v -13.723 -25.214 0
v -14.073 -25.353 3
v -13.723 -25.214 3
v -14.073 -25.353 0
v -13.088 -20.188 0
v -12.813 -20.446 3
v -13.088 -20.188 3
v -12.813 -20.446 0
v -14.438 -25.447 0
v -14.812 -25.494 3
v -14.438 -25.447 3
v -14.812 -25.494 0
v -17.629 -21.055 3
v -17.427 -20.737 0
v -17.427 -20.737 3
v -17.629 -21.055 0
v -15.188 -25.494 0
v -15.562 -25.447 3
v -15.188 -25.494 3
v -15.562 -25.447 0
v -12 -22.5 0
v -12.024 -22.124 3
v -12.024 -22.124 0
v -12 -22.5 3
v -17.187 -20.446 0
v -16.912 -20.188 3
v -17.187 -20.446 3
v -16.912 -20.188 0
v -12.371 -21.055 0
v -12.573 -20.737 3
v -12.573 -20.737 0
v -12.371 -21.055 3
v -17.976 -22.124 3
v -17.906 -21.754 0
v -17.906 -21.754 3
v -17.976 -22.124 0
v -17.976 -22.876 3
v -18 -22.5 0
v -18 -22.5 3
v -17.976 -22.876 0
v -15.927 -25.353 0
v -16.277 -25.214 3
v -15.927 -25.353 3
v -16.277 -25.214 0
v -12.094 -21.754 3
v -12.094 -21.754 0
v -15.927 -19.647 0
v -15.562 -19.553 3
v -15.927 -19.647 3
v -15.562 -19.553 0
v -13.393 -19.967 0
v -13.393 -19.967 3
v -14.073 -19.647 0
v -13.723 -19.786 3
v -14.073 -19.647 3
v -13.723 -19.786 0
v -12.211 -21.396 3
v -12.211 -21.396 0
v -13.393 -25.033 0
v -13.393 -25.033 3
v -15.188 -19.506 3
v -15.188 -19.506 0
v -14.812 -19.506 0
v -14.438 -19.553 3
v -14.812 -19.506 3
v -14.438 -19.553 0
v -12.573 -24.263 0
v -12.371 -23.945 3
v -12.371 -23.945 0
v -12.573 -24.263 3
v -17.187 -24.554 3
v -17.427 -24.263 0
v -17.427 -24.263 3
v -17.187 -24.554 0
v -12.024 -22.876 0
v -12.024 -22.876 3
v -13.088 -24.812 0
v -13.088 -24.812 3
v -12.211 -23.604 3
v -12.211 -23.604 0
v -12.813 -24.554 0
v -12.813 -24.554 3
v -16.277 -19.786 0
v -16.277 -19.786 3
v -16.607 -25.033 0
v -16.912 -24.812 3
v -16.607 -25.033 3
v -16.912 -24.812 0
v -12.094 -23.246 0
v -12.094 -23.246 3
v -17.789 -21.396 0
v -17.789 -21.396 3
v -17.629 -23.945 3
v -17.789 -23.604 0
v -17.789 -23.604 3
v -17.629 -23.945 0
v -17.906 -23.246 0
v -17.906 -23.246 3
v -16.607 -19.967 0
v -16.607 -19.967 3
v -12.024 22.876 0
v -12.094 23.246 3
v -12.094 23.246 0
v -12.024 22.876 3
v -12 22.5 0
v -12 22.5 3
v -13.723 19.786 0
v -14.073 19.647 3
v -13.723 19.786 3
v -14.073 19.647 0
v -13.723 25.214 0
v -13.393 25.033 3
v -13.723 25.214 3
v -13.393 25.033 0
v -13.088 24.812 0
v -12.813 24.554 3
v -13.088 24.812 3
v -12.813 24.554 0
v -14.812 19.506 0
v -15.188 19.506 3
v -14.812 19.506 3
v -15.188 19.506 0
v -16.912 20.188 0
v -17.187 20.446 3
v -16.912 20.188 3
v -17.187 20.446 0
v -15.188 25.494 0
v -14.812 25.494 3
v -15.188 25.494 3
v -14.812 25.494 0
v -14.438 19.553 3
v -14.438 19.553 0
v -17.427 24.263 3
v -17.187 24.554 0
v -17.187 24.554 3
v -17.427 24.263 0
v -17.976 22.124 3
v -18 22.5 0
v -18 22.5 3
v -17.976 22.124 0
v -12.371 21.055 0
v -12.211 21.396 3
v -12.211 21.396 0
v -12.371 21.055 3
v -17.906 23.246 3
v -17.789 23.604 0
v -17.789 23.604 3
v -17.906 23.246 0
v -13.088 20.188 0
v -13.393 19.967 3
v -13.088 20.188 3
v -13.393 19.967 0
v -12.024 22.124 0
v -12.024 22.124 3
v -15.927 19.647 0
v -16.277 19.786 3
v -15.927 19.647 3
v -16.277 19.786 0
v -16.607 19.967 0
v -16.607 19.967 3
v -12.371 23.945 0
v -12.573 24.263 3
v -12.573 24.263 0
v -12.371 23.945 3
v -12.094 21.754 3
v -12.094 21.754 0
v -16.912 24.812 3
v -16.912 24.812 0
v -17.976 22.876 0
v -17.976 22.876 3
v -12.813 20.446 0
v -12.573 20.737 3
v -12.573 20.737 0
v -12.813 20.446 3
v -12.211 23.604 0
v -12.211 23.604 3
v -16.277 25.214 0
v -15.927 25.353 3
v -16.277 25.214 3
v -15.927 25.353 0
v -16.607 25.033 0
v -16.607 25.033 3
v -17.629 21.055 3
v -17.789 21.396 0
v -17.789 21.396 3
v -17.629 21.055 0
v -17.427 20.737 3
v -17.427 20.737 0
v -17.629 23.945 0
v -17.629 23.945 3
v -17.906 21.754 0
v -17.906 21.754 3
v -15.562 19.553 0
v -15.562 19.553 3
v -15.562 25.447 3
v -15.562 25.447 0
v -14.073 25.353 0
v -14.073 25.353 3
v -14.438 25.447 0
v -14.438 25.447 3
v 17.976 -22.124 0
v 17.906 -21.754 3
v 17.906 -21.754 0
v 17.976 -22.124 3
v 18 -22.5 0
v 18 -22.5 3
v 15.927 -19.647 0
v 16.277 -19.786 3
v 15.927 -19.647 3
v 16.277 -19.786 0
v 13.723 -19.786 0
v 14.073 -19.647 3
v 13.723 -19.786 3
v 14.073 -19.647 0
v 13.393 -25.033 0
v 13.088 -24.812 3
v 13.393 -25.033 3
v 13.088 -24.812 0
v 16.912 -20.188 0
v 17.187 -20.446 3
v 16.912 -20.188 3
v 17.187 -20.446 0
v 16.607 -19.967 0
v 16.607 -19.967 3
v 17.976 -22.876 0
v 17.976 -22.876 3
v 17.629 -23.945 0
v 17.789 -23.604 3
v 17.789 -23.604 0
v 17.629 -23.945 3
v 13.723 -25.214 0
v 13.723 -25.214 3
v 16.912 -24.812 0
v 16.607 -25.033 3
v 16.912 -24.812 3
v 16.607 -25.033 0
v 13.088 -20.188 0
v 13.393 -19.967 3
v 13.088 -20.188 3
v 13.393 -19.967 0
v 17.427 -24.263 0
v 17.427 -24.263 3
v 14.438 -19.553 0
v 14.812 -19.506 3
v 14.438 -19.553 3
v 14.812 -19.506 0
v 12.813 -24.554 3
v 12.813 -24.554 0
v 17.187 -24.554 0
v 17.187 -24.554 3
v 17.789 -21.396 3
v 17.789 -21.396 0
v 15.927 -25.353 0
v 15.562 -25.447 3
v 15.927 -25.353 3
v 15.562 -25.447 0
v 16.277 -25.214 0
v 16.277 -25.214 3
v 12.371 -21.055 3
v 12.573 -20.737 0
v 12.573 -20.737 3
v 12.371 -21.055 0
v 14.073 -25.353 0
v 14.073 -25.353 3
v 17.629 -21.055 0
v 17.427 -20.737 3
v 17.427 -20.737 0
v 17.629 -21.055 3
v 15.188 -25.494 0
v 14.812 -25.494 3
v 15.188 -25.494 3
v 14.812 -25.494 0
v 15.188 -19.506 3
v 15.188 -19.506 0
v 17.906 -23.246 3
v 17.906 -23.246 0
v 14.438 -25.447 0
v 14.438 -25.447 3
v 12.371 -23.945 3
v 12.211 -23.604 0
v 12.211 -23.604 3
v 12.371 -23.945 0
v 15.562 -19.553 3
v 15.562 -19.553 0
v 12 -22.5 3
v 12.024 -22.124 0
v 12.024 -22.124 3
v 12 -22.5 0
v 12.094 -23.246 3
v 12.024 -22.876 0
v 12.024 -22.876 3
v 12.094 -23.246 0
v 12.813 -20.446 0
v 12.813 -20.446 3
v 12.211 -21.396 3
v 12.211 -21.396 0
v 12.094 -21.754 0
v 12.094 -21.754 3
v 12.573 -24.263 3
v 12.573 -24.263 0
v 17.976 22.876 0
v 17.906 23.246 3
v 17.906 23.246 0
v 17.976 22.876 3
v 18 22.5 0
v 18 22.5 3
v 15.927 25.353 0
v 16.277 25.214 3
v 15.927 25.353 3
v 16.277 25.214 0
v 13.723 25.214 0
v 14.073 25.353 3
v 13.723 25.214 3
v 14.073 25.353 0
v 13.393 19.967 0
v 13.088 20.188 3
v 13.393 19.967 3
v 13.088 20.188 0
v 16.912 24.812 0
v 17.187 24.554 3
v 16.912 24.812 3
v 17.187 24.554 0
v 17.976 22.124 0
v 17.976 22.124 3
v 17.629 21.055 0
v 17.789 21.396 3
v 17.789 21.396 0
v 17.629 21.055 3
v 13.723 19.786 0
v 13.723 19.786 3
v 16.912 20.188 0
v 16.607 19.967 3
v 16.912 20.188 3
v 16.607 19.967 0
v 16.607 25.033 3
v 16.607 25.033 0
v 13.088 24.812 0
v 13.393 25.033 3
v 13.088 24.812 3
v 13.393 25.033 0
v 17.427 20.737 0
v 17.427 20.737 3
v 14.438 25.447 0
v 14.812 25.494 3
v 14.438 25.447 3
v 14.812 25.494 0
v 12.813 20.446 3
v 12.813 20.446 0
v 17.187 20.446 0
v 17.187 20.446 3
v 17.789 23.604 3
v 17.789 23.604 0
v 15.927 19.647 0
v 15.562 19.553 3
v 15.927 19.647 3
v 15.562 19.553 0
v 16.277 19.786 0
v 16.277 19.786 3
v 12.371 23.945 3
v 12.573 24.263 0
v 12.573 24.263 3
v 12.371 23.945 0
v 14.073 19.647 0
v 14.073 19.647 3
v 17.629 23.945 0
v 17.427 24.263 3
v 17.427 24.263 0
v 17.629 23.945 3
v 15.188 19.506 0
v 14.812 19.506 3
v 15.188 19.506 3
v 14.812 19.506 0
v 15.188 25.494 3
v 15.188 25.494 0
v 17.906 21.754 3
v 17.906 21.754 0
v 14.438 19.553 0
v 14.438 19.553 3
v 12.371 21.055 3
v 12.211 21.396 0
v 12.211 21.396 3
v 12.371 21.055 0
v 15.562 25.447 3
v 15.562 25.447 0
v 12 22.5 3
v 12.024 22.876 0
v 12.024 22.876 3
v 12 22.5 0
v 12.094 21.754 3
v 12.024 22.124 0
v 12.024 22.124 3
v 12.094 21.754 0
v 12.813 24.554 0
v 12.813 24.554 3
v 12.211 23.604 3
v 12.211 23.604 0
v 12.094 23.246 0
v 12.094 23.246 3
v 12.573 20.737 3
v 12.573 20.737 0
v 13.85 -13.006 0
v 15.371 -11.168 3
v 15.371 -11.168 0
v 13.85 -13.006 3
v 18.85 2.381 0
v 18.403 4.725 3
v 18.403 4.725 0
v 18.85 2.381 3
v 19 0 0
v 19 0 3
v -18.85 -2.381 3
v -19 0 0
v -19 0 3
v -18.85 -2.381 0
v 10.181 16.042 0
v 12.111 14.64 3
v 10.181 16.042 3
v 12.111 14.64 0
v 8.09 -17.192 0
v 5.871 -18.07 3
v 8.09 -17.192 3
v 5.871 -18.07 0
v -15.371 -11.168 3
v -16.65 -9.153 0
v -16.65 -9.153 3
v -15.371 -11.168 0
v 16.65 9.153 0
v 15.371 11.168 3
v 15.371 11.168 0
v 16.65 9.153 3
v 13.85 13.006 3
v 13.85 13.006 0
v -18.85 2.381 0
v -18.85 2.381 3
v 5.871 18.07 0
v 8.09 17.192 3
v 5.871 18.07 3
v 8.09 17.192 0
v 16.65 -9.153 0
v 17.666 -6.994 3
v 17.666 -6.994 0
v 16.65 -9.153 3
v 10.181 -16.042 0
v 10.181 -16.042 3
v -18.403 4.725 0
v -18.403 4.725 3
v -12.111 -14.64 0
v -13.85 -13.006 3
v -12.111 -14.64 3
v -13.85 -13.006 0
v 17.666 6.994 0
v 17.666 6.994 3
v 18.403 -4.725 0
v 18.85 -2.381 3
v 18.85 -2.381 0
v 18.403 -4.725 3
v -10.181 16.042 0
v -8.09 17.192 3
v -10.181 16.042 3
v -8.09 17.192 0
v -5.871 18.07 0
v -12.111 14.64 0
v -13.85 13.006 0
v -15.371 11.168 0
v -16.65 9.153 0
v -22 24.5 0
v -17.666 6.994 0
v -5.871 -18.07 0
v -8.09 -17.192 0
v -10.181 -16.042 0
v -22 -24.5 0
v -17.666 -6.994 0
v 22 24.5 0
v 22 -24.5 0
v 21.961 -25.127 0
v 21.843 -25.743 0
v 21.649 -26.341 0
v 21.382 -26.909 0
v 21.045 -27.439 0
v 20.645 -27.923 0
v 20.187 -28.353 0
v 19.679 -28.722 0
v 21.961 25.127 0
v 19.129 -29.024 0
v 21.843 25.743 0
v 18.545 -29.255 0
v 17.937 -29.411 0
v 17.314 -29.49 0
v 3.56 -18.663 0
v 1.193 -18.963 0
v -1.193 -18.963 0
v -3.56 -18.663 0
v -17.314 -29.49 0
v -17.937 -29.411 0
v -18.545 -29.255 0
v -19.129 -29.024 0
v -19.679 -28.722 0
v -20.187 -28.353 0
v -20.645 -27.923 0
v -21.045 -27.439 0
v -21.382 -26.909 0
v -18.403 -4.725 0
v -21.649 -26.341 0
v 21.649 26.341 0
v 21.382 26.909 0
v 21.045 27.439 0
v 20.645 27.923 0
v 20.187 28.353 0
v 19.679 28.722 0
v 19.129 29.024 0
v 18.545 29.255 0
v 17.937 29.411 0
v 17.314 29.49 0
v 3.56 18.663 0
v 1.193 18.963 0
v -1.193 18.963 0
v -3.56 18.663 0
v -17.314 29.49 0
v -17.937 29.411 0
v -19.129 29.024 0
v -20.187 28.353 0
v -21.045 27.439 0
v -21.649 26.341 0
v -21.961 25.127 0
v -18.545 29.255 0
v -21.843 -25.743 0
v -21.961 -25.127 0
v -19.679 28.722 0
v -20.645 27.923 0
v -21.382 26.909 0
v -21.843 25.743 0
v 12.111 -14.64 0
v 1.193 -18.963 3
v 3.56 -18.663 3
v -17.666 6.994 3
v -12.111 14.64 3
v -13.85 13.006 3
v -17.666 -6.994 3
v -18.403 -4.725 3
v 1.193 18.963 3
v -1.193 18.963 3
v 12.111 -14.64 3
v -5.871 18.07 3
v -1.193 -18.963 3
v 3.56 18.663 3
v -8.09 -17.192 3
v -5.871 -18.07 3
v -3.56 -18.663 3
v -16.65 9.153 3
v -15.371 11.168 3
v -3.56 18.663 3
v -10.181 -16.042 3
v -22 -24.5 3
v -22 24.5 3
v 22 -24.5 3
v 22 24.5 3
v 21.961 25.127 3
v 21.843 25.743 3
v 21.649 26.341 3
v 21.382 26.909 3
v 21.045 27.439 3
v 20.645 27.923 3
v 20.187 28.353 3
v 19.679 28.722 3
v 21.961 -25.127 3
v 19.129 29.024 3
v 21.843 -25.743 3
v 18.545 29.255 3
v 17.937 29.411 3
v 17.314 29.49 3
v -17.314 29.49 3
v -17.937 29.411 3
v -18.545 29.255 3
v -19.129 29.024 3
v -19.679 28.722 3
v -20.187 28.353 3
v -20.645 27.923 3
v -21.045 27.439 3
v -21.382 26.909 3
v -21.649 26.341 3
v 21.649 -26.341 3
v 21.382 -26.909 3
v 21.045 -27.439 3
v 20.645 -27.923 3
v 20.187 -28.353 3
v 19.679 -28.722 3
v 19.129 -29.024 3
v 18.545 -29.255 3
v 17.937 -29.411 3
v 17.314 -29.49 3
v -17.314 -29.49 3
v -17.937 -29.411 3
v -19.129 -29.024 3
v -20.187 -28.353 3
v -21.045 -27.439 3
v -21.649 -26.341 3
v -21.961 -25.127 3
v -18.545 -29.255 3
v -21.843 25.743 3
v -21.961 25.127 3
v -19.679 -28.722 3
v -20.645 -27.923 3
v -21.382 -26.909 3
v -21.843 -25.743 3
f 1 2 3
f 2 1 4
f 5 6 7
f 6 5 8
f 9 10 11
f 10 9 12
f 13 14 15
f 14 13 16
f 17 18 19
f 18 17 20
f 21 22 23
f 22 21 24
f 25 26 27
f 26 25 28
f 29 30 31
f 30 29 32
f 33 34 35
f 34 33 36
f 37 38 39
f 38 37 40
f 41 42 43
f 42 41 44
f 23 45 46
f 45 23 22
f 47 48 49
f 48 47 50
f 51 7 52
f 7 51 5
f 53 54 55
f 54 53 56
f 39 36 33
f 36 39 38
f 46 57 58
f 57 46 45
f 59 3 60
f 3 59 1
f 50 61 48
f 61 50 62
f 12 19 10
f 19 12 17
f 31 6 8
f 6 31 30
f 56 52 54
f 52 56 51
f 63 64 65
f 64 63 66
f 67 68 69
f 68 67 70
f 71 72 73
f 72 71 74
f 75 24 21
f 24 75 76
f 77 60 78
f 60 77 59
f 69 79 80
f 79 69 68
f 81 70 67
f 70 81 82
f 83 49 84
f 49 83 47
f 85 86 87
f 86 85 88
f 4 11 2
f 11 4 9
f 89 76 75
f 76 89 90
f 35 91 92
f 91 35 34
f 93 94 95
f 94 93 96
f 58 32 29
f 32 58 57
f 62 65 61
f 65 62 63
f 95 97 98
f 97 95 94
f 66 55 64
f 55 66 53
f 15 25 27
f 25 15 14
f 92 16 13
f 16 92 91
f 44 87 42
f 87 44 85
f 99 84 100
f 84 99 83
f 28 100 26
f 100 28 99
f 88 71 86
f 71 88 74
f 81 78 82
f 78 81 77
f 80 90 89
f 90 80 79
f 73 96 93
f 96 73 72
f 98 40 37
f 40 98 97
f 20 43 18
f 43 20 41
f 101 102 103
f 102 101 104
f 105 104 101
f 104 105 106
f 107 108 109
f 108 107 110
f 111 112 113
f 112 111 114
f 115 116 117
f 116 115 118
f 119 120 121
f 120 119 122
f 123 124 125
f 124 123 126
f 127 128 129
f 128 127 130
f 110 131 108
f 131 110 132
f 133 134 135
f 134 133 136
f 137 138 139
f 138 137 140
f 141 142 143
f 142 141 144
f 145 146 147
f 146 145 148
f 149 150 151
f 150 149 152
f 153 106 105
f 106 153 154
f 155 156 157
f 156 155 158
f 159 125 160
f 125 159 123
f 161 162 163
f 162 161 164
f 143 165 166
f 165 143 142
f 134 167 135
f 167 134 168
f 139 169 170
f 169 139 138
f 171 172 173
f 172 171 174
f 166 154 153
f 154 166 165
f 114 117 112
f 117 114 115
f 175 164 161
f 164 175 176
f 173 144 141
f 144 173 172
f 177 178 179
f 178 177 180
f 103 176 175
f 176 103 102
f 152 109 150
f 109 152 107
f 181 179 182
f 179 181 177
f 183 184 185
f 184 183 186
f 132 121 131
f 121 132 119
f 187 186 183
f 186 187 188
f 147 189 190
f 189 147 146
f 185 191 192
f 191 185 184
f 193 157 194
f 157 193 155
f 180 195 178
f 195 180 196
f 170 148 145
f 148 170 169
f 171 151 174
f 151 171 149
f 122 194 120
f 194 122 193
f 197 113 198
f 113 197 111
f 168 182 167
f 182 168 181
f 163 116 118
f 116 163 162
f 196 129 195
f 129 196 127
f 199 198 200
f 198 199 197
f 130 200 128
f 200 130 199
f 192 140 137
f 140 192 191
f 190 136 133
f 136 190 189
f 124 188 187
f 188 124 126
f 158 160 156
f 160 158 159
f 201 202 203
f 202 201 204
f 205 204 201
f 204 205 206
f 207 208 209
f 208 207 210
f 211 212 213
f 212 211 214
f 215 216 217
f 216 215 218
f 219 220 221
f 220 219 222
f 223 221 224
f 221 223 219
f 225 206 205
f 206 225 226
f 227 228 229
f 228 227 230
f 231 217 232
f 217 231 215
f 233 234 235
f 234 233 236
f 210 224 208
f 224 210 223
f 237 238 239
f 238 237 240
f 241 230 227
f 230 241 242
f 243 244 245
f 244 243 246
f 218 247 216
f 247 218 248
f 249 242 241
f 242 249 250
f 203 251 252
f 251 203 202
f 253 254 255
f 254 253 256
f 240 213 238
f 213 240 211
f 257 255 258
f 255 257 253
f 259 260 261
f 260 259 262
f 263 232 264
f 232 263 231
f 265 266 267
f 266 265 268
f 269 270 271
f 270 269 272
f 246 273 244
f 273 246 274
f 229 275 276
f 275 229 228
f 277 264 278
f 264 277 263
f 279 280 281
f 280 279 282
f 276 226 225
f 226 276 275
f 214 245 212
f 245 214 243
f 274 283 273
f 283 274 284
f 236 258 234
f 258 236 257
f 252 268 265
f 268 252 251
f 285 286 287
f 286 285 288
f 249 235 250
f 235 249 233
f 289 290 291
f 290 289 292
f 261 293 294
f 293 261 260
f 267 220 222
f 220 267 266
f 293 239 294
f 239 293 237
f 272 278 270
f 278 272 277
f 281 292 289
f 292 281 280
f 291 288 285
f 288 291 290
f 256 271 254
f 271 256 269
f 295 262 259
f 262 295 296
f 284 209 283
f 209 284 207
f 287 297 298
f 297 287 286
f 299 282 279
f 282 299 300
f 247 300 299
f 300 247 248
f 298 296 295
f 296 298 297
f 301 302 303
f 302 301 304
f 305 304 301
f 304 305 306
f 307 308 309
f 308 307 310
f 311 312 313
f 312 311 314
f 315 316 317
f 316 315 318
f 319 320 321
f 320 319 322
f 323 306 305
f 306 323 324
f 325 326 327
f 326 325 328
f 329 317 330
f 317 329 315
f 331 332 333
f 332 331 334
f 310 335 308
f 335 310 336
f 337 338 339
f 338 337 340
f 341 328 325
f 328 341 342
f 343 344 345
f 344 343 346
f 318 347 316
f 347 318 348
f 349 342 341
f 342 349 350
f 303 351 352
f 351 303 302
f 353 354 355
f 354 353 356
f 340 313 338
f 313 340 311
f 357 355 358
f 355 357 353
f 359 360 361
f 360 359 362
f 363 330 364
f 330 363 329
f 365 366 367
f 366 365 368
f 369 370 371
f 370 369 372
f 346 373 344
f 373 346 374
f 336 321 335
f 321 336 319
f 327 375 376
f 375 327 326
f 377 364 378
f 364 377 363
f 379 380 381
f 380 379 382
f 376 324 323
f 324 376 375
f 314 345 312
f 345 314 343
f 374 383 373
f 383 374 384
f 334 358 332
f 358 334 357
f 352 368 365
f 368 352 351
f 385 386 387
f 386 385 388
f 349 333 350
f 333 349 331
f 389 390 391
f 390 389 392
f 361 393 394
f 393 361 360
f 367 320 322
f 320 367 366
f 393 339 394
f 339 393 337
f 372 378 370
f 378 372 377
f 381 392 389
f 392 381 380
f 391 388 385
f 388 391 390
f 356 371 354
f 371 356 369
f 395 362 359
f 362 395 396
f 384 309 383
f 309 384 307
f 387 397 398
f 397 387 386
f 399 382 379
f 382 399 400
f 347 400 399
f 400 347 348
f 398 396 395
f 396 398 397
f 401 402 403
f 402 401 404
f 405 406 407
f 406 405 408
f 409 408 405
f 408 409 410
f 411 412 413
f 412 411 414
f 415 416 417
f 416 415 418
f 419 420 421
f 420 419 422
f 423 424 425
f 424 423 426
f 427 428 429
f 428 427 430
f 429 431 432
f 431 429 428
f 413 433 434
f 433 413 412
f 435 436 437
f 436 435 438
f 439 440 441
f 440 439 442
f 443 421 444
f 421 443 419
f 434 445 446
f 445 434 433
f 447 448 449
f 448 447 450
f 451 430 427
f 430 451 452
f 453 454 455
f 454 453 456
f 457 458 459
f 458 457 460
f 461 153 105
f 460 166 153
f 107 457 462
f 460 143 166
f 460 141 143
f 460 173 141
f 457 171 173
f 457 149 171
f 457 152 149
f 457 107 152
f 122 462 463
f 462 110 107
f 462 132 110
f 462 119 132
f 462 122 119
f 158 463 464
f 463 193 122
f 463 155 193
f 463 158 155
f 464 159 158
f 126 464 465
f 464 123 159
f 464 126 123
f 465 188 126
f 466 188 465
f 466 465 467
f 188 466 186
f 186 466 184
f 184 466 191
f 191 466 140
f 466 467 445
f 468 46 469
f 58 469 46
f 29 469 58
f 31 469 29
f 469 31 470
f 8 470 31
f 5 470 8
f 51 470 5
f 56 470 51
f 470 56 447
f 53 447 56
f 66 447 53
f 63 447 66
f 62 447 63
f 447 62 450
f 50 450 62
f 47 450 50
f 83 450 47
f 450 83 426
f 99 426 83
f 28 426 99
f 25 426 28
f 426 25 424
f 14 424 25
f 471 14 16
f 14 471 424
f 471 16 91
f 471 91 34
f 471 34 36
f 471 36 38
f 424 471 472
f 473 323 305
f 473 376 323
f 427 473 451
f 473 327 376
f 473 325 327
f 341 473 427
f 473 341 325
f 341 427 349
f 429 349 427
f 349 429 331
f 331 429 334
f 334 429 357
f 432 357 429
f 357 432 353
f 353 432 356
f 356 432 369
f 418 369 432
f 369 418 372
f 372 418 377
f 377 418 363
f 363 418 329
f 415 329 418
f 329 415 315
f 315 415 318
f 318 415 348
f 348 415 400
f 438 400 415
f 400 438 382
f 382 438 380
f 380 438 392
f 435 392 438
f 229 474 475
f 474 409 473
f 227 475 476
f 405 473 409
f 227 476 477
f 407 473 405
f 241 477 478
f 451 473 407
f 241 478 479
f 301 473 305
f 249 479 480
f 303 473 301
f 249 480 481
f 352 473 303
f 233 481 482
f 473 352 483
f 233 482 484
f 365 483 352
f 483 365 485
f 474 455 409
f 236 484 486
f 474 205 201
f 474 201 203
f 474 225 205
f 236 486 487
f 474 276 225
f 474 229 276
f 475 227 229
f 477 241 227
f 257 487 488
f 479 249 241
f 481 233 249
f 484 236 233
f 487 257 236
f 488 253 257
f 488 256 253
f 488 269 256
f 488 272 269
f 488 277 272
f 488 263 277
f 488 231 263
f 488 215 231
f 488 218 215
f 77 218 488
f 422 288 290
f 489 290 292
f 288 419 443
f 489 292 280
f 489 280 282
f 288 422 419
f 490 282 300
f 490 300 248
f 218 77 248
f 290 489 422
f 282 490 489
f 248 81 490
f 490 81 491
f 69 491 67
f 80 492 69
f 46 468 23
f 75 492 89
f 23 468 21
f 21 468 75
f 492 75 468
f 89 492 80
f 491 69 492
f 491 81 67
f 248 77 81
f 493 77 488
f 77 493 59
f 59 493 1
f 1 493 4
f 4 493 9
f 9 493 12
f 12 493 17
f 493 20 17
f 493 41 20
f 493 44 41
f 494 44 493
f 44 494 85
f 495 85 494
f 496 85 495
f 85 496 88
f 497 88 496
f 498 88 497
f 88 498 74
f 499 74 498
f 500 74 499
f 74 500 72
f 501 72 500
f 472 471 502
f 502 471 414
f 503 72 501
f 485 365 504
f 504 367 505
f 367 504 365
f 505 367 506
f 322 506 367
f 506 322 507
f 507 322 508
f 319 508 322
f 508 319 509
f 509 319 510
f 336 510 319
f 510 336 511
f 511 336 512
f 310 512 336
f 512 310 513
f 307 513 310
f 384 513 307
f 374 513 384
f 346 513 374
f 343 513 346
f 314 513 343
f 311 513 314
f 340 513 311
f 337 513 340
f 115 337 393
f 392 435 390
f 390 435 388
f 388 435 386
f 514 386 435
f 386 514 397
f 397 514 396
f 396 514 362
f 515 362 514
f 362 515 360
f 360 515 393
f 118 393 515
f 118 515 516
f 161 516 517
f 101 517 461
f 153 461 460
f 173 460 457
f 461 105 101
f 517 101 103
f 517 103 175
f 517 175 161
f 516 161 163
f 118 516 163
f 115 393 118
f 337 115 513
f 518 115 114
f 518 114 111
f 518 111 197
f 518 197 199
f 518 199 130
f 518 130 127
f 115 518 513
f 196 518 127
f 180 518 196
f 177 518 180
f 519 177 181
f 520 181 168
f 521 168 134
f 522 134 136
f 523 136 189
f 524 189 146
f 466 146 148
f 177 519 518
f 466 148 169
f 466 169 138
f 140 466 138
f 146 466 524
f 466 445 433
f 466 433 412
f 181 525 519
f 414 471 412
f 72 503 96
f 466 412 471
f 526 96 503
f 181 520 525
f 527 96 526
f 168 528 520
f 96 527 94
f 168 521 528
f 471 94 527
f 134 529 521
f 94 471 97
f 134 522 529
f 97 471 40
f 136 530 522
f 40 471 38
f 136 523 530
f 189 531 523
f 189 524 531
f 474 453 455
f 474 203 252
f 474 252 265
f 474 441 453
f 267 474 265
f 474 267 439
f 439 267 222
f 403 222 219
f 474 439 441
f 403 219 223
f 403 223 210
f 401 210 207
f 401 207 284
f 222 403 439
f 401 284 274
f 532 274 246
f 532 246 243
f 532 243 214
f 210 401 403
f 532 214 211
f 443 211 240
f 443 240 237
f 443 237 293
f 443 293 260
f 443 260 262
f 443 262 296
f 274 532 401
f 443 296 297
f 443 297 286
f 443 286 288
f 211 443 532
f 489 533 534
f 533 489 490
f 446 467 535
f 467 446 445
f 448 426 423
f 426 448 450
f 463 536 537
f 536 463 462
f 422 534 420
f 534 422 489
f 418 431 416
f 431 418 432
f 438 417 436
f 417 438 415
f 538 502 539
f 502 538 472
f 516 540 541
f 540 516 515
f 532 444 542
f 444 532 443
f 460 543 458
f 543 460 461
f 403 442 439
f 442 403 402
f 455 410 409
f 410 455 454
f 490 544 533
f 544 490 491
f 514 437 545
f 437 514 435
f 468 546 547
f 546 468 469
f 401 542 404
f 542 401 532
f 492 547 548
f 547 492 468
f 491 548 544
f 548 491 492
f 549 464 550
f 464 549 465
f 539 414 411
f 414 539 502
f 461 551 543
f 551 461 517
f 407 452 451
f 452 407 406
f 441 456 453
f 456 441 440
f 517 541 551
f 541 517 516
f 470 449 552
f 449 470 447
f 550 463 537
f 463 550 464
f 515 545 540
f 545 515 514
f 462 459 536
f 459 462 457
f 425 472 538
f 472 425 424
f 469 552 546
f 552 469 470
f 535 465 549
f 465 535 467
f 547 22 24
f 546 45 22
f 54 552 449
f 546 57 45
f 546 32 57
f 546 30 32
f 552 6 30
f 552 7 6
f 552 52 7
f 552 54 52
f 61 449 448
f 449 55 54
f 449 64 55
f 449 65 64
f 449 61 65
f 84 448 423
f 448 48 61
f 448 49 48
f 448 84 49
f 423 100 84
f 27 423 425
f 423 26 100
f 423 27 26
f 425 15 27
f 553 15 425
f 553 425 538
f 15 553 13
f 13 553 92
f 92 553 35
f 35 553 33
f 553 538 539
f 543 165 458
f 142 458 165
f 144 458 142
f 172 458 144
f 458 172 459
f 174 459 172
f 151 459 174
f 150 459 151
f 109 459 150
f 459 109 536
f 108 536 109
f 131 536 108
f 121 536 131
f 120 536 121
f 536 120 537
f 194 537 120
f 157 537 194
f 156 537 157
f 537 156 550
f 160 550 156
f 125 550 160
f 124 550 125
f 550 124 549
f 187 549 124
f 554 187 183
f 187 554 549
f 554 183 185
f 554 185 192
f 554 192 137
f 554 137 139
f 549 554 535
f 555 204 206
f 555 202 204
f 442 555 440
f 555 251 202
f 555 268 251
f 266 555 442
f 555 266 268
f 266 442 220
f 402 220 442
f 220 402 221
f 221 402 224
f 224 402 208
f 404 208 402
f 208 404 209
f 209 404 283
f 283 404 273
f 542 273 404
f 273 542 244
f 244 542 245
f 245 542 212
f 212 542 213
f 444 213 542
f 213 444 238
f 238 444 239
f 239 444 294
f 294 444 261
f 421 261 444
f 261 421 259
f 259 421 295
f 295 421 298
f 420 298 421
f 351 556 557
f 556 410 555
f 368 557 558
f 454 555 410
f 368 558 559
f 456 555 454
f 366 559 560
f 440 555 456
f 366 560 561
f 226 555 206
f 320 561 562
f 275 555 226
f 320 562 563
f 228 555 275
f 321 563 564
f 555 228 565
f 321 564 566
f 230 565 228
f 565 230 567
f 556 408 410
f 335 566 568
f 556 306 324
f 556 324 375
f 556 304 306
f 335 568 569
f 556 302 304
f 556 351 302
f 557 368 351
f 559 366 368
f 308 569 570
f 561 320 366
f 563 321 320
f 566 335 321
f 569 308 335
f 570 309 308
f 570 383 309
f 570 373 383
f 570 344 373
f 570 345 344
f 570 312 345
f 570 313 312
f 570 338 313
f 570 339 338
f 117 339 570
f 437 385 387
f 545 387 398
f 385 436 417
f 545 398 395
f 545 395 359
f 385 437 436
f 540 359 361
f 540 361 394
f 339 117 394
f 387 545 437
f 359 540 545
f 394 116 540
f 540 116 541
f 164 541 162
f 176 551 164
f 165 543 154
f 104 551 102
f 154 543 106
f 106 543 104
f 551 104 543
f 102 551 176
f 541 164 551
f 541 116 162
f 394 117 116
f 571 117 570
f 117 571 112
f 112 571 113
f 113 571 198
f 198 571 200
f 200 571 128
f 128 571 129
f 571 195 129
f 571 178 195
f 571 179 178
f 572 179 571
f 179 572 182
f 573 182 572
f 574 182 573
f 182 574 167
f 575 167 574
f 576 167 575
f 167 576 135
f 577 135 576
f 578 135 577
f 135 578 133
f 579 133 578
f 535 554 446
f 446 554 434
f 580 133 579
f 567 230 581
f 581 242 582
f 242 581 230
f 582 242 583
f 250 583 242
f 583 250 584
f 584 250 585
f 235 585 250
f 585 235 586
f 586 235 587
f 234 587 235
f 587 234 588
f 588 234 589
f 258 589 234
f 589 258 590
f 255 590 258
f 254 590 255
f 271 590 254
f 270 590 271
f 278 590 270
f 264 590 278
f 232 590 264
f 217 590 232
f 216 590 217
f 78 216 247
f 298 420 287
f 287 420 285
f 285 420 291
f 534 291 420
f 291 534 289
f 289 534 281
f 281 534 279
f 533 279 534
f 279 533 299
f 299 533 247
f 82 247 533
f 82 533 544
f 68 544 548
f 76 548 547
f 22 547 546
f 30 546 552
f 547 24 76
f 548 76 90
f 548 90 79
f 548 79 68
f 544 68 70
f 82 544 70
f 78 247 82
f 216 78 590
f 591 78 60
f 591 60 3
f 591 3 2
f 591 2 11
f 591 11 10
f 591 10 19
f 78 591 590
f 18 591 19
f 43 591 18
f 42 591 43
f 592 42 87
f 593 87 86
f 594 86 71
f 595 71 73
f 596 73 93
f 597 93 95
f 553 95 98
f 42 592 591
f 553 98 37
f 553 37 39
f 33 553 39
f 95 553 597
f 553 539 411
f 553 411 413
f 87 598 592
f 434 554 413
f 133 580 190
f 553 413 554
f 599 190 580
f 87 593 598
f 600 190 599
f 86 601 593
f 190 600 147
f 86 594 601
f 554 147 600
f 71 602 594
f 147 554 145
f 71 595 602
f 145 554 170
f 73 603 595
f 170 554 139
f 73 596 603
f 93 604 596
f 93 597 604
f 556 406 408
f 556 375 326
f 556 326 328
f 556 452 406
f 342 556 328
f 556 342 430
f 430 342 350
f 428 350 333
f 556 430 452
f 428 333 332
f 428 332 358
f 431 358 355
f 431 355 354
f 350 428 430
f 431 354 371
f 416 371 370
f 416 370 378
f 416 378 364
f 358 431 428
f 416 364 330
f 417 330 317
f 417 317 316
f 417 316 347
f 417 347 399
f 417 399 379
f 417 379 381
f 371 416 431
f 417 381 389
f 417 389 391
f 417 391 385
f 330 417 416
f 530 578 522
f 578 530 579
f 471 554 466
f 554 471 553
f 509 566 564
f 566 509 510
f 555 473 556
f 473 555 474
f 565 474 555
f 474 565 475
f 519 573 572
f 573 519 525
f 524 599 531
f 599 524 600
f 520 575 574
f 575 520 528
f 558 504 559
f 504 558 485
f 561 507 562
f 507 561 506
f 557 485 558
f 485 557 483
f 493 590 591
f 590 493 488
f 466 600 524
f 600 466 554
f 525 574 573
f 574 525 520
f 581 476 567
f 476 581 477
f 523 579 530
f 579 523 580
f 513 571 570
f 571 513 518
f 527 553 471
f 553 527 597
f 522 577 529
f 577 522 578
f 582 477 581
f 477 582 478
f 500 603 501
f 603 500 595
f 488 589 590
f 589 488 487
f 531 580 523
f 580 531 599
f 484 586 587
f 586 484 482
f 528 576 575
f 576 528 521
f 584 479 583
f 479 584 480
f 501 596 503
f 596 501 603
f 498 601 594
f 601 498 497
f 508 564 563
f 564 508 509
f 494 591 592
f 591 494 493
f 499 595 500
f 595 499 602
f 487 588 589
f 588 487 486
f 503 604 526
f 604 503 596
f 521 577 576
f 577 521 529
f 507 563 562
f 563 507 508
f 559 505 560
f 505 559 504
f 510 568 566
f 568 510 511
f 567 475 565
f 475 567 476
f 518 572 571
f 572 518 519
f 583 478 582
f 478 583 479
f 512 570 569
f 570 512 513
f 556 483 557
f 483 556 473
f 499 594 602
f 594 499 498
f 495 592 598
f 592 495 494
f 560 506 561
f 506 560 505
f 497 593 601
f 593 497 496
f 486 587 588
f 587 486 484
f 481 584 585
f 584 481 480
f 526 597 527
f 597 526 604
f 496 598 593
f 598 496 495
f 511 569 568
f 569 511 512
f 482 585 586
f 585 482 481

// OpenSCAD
$fn = 50;


difference() {
	union() {
		hull() {
			translate(v = [-17.0000000000, 24.5000000000, 0]) {
				cylinder(h = 3, r = 5);
			}
			translate(v = [17.0000000000, 24.5000000000, 0]) {
				cylinder(h = 3, r = 5);
			}
			translate(v = [-17.0000000000, -24.5000000000, 0]) {
				cylinder(h = 3, r = 5);
			}
			translate(v = [17.0000000000, -24.5000000000, 0]) {
				cylinder(h = 3, r = 5);
			}
		}
	}
	union() {
		#translate(v = [-15.0000000000, -22.5000000000, -100.0000000000]) {
			cylinder(h = 200, r = 3.0000000000);
		}
		#translate(v = [-15.0000000000, 22.5000000000, -100.0000000000]) {
			cylinder(h = 200, r = 3.0000000000);
		}
		#translate(v = [15.0000000000, -22.5000000000, -100.0000000000]) {
			cylinder(h = 200, r = 3.0000000000);
		}
		#translate(v = [15.0000000000, 22.5000000000, -100.0000000000]) {
			cylinder(h = 200, r = 3.0000000000);
		}
		#cylinder(h = 3, r = 19.0000000000);
	}
}
